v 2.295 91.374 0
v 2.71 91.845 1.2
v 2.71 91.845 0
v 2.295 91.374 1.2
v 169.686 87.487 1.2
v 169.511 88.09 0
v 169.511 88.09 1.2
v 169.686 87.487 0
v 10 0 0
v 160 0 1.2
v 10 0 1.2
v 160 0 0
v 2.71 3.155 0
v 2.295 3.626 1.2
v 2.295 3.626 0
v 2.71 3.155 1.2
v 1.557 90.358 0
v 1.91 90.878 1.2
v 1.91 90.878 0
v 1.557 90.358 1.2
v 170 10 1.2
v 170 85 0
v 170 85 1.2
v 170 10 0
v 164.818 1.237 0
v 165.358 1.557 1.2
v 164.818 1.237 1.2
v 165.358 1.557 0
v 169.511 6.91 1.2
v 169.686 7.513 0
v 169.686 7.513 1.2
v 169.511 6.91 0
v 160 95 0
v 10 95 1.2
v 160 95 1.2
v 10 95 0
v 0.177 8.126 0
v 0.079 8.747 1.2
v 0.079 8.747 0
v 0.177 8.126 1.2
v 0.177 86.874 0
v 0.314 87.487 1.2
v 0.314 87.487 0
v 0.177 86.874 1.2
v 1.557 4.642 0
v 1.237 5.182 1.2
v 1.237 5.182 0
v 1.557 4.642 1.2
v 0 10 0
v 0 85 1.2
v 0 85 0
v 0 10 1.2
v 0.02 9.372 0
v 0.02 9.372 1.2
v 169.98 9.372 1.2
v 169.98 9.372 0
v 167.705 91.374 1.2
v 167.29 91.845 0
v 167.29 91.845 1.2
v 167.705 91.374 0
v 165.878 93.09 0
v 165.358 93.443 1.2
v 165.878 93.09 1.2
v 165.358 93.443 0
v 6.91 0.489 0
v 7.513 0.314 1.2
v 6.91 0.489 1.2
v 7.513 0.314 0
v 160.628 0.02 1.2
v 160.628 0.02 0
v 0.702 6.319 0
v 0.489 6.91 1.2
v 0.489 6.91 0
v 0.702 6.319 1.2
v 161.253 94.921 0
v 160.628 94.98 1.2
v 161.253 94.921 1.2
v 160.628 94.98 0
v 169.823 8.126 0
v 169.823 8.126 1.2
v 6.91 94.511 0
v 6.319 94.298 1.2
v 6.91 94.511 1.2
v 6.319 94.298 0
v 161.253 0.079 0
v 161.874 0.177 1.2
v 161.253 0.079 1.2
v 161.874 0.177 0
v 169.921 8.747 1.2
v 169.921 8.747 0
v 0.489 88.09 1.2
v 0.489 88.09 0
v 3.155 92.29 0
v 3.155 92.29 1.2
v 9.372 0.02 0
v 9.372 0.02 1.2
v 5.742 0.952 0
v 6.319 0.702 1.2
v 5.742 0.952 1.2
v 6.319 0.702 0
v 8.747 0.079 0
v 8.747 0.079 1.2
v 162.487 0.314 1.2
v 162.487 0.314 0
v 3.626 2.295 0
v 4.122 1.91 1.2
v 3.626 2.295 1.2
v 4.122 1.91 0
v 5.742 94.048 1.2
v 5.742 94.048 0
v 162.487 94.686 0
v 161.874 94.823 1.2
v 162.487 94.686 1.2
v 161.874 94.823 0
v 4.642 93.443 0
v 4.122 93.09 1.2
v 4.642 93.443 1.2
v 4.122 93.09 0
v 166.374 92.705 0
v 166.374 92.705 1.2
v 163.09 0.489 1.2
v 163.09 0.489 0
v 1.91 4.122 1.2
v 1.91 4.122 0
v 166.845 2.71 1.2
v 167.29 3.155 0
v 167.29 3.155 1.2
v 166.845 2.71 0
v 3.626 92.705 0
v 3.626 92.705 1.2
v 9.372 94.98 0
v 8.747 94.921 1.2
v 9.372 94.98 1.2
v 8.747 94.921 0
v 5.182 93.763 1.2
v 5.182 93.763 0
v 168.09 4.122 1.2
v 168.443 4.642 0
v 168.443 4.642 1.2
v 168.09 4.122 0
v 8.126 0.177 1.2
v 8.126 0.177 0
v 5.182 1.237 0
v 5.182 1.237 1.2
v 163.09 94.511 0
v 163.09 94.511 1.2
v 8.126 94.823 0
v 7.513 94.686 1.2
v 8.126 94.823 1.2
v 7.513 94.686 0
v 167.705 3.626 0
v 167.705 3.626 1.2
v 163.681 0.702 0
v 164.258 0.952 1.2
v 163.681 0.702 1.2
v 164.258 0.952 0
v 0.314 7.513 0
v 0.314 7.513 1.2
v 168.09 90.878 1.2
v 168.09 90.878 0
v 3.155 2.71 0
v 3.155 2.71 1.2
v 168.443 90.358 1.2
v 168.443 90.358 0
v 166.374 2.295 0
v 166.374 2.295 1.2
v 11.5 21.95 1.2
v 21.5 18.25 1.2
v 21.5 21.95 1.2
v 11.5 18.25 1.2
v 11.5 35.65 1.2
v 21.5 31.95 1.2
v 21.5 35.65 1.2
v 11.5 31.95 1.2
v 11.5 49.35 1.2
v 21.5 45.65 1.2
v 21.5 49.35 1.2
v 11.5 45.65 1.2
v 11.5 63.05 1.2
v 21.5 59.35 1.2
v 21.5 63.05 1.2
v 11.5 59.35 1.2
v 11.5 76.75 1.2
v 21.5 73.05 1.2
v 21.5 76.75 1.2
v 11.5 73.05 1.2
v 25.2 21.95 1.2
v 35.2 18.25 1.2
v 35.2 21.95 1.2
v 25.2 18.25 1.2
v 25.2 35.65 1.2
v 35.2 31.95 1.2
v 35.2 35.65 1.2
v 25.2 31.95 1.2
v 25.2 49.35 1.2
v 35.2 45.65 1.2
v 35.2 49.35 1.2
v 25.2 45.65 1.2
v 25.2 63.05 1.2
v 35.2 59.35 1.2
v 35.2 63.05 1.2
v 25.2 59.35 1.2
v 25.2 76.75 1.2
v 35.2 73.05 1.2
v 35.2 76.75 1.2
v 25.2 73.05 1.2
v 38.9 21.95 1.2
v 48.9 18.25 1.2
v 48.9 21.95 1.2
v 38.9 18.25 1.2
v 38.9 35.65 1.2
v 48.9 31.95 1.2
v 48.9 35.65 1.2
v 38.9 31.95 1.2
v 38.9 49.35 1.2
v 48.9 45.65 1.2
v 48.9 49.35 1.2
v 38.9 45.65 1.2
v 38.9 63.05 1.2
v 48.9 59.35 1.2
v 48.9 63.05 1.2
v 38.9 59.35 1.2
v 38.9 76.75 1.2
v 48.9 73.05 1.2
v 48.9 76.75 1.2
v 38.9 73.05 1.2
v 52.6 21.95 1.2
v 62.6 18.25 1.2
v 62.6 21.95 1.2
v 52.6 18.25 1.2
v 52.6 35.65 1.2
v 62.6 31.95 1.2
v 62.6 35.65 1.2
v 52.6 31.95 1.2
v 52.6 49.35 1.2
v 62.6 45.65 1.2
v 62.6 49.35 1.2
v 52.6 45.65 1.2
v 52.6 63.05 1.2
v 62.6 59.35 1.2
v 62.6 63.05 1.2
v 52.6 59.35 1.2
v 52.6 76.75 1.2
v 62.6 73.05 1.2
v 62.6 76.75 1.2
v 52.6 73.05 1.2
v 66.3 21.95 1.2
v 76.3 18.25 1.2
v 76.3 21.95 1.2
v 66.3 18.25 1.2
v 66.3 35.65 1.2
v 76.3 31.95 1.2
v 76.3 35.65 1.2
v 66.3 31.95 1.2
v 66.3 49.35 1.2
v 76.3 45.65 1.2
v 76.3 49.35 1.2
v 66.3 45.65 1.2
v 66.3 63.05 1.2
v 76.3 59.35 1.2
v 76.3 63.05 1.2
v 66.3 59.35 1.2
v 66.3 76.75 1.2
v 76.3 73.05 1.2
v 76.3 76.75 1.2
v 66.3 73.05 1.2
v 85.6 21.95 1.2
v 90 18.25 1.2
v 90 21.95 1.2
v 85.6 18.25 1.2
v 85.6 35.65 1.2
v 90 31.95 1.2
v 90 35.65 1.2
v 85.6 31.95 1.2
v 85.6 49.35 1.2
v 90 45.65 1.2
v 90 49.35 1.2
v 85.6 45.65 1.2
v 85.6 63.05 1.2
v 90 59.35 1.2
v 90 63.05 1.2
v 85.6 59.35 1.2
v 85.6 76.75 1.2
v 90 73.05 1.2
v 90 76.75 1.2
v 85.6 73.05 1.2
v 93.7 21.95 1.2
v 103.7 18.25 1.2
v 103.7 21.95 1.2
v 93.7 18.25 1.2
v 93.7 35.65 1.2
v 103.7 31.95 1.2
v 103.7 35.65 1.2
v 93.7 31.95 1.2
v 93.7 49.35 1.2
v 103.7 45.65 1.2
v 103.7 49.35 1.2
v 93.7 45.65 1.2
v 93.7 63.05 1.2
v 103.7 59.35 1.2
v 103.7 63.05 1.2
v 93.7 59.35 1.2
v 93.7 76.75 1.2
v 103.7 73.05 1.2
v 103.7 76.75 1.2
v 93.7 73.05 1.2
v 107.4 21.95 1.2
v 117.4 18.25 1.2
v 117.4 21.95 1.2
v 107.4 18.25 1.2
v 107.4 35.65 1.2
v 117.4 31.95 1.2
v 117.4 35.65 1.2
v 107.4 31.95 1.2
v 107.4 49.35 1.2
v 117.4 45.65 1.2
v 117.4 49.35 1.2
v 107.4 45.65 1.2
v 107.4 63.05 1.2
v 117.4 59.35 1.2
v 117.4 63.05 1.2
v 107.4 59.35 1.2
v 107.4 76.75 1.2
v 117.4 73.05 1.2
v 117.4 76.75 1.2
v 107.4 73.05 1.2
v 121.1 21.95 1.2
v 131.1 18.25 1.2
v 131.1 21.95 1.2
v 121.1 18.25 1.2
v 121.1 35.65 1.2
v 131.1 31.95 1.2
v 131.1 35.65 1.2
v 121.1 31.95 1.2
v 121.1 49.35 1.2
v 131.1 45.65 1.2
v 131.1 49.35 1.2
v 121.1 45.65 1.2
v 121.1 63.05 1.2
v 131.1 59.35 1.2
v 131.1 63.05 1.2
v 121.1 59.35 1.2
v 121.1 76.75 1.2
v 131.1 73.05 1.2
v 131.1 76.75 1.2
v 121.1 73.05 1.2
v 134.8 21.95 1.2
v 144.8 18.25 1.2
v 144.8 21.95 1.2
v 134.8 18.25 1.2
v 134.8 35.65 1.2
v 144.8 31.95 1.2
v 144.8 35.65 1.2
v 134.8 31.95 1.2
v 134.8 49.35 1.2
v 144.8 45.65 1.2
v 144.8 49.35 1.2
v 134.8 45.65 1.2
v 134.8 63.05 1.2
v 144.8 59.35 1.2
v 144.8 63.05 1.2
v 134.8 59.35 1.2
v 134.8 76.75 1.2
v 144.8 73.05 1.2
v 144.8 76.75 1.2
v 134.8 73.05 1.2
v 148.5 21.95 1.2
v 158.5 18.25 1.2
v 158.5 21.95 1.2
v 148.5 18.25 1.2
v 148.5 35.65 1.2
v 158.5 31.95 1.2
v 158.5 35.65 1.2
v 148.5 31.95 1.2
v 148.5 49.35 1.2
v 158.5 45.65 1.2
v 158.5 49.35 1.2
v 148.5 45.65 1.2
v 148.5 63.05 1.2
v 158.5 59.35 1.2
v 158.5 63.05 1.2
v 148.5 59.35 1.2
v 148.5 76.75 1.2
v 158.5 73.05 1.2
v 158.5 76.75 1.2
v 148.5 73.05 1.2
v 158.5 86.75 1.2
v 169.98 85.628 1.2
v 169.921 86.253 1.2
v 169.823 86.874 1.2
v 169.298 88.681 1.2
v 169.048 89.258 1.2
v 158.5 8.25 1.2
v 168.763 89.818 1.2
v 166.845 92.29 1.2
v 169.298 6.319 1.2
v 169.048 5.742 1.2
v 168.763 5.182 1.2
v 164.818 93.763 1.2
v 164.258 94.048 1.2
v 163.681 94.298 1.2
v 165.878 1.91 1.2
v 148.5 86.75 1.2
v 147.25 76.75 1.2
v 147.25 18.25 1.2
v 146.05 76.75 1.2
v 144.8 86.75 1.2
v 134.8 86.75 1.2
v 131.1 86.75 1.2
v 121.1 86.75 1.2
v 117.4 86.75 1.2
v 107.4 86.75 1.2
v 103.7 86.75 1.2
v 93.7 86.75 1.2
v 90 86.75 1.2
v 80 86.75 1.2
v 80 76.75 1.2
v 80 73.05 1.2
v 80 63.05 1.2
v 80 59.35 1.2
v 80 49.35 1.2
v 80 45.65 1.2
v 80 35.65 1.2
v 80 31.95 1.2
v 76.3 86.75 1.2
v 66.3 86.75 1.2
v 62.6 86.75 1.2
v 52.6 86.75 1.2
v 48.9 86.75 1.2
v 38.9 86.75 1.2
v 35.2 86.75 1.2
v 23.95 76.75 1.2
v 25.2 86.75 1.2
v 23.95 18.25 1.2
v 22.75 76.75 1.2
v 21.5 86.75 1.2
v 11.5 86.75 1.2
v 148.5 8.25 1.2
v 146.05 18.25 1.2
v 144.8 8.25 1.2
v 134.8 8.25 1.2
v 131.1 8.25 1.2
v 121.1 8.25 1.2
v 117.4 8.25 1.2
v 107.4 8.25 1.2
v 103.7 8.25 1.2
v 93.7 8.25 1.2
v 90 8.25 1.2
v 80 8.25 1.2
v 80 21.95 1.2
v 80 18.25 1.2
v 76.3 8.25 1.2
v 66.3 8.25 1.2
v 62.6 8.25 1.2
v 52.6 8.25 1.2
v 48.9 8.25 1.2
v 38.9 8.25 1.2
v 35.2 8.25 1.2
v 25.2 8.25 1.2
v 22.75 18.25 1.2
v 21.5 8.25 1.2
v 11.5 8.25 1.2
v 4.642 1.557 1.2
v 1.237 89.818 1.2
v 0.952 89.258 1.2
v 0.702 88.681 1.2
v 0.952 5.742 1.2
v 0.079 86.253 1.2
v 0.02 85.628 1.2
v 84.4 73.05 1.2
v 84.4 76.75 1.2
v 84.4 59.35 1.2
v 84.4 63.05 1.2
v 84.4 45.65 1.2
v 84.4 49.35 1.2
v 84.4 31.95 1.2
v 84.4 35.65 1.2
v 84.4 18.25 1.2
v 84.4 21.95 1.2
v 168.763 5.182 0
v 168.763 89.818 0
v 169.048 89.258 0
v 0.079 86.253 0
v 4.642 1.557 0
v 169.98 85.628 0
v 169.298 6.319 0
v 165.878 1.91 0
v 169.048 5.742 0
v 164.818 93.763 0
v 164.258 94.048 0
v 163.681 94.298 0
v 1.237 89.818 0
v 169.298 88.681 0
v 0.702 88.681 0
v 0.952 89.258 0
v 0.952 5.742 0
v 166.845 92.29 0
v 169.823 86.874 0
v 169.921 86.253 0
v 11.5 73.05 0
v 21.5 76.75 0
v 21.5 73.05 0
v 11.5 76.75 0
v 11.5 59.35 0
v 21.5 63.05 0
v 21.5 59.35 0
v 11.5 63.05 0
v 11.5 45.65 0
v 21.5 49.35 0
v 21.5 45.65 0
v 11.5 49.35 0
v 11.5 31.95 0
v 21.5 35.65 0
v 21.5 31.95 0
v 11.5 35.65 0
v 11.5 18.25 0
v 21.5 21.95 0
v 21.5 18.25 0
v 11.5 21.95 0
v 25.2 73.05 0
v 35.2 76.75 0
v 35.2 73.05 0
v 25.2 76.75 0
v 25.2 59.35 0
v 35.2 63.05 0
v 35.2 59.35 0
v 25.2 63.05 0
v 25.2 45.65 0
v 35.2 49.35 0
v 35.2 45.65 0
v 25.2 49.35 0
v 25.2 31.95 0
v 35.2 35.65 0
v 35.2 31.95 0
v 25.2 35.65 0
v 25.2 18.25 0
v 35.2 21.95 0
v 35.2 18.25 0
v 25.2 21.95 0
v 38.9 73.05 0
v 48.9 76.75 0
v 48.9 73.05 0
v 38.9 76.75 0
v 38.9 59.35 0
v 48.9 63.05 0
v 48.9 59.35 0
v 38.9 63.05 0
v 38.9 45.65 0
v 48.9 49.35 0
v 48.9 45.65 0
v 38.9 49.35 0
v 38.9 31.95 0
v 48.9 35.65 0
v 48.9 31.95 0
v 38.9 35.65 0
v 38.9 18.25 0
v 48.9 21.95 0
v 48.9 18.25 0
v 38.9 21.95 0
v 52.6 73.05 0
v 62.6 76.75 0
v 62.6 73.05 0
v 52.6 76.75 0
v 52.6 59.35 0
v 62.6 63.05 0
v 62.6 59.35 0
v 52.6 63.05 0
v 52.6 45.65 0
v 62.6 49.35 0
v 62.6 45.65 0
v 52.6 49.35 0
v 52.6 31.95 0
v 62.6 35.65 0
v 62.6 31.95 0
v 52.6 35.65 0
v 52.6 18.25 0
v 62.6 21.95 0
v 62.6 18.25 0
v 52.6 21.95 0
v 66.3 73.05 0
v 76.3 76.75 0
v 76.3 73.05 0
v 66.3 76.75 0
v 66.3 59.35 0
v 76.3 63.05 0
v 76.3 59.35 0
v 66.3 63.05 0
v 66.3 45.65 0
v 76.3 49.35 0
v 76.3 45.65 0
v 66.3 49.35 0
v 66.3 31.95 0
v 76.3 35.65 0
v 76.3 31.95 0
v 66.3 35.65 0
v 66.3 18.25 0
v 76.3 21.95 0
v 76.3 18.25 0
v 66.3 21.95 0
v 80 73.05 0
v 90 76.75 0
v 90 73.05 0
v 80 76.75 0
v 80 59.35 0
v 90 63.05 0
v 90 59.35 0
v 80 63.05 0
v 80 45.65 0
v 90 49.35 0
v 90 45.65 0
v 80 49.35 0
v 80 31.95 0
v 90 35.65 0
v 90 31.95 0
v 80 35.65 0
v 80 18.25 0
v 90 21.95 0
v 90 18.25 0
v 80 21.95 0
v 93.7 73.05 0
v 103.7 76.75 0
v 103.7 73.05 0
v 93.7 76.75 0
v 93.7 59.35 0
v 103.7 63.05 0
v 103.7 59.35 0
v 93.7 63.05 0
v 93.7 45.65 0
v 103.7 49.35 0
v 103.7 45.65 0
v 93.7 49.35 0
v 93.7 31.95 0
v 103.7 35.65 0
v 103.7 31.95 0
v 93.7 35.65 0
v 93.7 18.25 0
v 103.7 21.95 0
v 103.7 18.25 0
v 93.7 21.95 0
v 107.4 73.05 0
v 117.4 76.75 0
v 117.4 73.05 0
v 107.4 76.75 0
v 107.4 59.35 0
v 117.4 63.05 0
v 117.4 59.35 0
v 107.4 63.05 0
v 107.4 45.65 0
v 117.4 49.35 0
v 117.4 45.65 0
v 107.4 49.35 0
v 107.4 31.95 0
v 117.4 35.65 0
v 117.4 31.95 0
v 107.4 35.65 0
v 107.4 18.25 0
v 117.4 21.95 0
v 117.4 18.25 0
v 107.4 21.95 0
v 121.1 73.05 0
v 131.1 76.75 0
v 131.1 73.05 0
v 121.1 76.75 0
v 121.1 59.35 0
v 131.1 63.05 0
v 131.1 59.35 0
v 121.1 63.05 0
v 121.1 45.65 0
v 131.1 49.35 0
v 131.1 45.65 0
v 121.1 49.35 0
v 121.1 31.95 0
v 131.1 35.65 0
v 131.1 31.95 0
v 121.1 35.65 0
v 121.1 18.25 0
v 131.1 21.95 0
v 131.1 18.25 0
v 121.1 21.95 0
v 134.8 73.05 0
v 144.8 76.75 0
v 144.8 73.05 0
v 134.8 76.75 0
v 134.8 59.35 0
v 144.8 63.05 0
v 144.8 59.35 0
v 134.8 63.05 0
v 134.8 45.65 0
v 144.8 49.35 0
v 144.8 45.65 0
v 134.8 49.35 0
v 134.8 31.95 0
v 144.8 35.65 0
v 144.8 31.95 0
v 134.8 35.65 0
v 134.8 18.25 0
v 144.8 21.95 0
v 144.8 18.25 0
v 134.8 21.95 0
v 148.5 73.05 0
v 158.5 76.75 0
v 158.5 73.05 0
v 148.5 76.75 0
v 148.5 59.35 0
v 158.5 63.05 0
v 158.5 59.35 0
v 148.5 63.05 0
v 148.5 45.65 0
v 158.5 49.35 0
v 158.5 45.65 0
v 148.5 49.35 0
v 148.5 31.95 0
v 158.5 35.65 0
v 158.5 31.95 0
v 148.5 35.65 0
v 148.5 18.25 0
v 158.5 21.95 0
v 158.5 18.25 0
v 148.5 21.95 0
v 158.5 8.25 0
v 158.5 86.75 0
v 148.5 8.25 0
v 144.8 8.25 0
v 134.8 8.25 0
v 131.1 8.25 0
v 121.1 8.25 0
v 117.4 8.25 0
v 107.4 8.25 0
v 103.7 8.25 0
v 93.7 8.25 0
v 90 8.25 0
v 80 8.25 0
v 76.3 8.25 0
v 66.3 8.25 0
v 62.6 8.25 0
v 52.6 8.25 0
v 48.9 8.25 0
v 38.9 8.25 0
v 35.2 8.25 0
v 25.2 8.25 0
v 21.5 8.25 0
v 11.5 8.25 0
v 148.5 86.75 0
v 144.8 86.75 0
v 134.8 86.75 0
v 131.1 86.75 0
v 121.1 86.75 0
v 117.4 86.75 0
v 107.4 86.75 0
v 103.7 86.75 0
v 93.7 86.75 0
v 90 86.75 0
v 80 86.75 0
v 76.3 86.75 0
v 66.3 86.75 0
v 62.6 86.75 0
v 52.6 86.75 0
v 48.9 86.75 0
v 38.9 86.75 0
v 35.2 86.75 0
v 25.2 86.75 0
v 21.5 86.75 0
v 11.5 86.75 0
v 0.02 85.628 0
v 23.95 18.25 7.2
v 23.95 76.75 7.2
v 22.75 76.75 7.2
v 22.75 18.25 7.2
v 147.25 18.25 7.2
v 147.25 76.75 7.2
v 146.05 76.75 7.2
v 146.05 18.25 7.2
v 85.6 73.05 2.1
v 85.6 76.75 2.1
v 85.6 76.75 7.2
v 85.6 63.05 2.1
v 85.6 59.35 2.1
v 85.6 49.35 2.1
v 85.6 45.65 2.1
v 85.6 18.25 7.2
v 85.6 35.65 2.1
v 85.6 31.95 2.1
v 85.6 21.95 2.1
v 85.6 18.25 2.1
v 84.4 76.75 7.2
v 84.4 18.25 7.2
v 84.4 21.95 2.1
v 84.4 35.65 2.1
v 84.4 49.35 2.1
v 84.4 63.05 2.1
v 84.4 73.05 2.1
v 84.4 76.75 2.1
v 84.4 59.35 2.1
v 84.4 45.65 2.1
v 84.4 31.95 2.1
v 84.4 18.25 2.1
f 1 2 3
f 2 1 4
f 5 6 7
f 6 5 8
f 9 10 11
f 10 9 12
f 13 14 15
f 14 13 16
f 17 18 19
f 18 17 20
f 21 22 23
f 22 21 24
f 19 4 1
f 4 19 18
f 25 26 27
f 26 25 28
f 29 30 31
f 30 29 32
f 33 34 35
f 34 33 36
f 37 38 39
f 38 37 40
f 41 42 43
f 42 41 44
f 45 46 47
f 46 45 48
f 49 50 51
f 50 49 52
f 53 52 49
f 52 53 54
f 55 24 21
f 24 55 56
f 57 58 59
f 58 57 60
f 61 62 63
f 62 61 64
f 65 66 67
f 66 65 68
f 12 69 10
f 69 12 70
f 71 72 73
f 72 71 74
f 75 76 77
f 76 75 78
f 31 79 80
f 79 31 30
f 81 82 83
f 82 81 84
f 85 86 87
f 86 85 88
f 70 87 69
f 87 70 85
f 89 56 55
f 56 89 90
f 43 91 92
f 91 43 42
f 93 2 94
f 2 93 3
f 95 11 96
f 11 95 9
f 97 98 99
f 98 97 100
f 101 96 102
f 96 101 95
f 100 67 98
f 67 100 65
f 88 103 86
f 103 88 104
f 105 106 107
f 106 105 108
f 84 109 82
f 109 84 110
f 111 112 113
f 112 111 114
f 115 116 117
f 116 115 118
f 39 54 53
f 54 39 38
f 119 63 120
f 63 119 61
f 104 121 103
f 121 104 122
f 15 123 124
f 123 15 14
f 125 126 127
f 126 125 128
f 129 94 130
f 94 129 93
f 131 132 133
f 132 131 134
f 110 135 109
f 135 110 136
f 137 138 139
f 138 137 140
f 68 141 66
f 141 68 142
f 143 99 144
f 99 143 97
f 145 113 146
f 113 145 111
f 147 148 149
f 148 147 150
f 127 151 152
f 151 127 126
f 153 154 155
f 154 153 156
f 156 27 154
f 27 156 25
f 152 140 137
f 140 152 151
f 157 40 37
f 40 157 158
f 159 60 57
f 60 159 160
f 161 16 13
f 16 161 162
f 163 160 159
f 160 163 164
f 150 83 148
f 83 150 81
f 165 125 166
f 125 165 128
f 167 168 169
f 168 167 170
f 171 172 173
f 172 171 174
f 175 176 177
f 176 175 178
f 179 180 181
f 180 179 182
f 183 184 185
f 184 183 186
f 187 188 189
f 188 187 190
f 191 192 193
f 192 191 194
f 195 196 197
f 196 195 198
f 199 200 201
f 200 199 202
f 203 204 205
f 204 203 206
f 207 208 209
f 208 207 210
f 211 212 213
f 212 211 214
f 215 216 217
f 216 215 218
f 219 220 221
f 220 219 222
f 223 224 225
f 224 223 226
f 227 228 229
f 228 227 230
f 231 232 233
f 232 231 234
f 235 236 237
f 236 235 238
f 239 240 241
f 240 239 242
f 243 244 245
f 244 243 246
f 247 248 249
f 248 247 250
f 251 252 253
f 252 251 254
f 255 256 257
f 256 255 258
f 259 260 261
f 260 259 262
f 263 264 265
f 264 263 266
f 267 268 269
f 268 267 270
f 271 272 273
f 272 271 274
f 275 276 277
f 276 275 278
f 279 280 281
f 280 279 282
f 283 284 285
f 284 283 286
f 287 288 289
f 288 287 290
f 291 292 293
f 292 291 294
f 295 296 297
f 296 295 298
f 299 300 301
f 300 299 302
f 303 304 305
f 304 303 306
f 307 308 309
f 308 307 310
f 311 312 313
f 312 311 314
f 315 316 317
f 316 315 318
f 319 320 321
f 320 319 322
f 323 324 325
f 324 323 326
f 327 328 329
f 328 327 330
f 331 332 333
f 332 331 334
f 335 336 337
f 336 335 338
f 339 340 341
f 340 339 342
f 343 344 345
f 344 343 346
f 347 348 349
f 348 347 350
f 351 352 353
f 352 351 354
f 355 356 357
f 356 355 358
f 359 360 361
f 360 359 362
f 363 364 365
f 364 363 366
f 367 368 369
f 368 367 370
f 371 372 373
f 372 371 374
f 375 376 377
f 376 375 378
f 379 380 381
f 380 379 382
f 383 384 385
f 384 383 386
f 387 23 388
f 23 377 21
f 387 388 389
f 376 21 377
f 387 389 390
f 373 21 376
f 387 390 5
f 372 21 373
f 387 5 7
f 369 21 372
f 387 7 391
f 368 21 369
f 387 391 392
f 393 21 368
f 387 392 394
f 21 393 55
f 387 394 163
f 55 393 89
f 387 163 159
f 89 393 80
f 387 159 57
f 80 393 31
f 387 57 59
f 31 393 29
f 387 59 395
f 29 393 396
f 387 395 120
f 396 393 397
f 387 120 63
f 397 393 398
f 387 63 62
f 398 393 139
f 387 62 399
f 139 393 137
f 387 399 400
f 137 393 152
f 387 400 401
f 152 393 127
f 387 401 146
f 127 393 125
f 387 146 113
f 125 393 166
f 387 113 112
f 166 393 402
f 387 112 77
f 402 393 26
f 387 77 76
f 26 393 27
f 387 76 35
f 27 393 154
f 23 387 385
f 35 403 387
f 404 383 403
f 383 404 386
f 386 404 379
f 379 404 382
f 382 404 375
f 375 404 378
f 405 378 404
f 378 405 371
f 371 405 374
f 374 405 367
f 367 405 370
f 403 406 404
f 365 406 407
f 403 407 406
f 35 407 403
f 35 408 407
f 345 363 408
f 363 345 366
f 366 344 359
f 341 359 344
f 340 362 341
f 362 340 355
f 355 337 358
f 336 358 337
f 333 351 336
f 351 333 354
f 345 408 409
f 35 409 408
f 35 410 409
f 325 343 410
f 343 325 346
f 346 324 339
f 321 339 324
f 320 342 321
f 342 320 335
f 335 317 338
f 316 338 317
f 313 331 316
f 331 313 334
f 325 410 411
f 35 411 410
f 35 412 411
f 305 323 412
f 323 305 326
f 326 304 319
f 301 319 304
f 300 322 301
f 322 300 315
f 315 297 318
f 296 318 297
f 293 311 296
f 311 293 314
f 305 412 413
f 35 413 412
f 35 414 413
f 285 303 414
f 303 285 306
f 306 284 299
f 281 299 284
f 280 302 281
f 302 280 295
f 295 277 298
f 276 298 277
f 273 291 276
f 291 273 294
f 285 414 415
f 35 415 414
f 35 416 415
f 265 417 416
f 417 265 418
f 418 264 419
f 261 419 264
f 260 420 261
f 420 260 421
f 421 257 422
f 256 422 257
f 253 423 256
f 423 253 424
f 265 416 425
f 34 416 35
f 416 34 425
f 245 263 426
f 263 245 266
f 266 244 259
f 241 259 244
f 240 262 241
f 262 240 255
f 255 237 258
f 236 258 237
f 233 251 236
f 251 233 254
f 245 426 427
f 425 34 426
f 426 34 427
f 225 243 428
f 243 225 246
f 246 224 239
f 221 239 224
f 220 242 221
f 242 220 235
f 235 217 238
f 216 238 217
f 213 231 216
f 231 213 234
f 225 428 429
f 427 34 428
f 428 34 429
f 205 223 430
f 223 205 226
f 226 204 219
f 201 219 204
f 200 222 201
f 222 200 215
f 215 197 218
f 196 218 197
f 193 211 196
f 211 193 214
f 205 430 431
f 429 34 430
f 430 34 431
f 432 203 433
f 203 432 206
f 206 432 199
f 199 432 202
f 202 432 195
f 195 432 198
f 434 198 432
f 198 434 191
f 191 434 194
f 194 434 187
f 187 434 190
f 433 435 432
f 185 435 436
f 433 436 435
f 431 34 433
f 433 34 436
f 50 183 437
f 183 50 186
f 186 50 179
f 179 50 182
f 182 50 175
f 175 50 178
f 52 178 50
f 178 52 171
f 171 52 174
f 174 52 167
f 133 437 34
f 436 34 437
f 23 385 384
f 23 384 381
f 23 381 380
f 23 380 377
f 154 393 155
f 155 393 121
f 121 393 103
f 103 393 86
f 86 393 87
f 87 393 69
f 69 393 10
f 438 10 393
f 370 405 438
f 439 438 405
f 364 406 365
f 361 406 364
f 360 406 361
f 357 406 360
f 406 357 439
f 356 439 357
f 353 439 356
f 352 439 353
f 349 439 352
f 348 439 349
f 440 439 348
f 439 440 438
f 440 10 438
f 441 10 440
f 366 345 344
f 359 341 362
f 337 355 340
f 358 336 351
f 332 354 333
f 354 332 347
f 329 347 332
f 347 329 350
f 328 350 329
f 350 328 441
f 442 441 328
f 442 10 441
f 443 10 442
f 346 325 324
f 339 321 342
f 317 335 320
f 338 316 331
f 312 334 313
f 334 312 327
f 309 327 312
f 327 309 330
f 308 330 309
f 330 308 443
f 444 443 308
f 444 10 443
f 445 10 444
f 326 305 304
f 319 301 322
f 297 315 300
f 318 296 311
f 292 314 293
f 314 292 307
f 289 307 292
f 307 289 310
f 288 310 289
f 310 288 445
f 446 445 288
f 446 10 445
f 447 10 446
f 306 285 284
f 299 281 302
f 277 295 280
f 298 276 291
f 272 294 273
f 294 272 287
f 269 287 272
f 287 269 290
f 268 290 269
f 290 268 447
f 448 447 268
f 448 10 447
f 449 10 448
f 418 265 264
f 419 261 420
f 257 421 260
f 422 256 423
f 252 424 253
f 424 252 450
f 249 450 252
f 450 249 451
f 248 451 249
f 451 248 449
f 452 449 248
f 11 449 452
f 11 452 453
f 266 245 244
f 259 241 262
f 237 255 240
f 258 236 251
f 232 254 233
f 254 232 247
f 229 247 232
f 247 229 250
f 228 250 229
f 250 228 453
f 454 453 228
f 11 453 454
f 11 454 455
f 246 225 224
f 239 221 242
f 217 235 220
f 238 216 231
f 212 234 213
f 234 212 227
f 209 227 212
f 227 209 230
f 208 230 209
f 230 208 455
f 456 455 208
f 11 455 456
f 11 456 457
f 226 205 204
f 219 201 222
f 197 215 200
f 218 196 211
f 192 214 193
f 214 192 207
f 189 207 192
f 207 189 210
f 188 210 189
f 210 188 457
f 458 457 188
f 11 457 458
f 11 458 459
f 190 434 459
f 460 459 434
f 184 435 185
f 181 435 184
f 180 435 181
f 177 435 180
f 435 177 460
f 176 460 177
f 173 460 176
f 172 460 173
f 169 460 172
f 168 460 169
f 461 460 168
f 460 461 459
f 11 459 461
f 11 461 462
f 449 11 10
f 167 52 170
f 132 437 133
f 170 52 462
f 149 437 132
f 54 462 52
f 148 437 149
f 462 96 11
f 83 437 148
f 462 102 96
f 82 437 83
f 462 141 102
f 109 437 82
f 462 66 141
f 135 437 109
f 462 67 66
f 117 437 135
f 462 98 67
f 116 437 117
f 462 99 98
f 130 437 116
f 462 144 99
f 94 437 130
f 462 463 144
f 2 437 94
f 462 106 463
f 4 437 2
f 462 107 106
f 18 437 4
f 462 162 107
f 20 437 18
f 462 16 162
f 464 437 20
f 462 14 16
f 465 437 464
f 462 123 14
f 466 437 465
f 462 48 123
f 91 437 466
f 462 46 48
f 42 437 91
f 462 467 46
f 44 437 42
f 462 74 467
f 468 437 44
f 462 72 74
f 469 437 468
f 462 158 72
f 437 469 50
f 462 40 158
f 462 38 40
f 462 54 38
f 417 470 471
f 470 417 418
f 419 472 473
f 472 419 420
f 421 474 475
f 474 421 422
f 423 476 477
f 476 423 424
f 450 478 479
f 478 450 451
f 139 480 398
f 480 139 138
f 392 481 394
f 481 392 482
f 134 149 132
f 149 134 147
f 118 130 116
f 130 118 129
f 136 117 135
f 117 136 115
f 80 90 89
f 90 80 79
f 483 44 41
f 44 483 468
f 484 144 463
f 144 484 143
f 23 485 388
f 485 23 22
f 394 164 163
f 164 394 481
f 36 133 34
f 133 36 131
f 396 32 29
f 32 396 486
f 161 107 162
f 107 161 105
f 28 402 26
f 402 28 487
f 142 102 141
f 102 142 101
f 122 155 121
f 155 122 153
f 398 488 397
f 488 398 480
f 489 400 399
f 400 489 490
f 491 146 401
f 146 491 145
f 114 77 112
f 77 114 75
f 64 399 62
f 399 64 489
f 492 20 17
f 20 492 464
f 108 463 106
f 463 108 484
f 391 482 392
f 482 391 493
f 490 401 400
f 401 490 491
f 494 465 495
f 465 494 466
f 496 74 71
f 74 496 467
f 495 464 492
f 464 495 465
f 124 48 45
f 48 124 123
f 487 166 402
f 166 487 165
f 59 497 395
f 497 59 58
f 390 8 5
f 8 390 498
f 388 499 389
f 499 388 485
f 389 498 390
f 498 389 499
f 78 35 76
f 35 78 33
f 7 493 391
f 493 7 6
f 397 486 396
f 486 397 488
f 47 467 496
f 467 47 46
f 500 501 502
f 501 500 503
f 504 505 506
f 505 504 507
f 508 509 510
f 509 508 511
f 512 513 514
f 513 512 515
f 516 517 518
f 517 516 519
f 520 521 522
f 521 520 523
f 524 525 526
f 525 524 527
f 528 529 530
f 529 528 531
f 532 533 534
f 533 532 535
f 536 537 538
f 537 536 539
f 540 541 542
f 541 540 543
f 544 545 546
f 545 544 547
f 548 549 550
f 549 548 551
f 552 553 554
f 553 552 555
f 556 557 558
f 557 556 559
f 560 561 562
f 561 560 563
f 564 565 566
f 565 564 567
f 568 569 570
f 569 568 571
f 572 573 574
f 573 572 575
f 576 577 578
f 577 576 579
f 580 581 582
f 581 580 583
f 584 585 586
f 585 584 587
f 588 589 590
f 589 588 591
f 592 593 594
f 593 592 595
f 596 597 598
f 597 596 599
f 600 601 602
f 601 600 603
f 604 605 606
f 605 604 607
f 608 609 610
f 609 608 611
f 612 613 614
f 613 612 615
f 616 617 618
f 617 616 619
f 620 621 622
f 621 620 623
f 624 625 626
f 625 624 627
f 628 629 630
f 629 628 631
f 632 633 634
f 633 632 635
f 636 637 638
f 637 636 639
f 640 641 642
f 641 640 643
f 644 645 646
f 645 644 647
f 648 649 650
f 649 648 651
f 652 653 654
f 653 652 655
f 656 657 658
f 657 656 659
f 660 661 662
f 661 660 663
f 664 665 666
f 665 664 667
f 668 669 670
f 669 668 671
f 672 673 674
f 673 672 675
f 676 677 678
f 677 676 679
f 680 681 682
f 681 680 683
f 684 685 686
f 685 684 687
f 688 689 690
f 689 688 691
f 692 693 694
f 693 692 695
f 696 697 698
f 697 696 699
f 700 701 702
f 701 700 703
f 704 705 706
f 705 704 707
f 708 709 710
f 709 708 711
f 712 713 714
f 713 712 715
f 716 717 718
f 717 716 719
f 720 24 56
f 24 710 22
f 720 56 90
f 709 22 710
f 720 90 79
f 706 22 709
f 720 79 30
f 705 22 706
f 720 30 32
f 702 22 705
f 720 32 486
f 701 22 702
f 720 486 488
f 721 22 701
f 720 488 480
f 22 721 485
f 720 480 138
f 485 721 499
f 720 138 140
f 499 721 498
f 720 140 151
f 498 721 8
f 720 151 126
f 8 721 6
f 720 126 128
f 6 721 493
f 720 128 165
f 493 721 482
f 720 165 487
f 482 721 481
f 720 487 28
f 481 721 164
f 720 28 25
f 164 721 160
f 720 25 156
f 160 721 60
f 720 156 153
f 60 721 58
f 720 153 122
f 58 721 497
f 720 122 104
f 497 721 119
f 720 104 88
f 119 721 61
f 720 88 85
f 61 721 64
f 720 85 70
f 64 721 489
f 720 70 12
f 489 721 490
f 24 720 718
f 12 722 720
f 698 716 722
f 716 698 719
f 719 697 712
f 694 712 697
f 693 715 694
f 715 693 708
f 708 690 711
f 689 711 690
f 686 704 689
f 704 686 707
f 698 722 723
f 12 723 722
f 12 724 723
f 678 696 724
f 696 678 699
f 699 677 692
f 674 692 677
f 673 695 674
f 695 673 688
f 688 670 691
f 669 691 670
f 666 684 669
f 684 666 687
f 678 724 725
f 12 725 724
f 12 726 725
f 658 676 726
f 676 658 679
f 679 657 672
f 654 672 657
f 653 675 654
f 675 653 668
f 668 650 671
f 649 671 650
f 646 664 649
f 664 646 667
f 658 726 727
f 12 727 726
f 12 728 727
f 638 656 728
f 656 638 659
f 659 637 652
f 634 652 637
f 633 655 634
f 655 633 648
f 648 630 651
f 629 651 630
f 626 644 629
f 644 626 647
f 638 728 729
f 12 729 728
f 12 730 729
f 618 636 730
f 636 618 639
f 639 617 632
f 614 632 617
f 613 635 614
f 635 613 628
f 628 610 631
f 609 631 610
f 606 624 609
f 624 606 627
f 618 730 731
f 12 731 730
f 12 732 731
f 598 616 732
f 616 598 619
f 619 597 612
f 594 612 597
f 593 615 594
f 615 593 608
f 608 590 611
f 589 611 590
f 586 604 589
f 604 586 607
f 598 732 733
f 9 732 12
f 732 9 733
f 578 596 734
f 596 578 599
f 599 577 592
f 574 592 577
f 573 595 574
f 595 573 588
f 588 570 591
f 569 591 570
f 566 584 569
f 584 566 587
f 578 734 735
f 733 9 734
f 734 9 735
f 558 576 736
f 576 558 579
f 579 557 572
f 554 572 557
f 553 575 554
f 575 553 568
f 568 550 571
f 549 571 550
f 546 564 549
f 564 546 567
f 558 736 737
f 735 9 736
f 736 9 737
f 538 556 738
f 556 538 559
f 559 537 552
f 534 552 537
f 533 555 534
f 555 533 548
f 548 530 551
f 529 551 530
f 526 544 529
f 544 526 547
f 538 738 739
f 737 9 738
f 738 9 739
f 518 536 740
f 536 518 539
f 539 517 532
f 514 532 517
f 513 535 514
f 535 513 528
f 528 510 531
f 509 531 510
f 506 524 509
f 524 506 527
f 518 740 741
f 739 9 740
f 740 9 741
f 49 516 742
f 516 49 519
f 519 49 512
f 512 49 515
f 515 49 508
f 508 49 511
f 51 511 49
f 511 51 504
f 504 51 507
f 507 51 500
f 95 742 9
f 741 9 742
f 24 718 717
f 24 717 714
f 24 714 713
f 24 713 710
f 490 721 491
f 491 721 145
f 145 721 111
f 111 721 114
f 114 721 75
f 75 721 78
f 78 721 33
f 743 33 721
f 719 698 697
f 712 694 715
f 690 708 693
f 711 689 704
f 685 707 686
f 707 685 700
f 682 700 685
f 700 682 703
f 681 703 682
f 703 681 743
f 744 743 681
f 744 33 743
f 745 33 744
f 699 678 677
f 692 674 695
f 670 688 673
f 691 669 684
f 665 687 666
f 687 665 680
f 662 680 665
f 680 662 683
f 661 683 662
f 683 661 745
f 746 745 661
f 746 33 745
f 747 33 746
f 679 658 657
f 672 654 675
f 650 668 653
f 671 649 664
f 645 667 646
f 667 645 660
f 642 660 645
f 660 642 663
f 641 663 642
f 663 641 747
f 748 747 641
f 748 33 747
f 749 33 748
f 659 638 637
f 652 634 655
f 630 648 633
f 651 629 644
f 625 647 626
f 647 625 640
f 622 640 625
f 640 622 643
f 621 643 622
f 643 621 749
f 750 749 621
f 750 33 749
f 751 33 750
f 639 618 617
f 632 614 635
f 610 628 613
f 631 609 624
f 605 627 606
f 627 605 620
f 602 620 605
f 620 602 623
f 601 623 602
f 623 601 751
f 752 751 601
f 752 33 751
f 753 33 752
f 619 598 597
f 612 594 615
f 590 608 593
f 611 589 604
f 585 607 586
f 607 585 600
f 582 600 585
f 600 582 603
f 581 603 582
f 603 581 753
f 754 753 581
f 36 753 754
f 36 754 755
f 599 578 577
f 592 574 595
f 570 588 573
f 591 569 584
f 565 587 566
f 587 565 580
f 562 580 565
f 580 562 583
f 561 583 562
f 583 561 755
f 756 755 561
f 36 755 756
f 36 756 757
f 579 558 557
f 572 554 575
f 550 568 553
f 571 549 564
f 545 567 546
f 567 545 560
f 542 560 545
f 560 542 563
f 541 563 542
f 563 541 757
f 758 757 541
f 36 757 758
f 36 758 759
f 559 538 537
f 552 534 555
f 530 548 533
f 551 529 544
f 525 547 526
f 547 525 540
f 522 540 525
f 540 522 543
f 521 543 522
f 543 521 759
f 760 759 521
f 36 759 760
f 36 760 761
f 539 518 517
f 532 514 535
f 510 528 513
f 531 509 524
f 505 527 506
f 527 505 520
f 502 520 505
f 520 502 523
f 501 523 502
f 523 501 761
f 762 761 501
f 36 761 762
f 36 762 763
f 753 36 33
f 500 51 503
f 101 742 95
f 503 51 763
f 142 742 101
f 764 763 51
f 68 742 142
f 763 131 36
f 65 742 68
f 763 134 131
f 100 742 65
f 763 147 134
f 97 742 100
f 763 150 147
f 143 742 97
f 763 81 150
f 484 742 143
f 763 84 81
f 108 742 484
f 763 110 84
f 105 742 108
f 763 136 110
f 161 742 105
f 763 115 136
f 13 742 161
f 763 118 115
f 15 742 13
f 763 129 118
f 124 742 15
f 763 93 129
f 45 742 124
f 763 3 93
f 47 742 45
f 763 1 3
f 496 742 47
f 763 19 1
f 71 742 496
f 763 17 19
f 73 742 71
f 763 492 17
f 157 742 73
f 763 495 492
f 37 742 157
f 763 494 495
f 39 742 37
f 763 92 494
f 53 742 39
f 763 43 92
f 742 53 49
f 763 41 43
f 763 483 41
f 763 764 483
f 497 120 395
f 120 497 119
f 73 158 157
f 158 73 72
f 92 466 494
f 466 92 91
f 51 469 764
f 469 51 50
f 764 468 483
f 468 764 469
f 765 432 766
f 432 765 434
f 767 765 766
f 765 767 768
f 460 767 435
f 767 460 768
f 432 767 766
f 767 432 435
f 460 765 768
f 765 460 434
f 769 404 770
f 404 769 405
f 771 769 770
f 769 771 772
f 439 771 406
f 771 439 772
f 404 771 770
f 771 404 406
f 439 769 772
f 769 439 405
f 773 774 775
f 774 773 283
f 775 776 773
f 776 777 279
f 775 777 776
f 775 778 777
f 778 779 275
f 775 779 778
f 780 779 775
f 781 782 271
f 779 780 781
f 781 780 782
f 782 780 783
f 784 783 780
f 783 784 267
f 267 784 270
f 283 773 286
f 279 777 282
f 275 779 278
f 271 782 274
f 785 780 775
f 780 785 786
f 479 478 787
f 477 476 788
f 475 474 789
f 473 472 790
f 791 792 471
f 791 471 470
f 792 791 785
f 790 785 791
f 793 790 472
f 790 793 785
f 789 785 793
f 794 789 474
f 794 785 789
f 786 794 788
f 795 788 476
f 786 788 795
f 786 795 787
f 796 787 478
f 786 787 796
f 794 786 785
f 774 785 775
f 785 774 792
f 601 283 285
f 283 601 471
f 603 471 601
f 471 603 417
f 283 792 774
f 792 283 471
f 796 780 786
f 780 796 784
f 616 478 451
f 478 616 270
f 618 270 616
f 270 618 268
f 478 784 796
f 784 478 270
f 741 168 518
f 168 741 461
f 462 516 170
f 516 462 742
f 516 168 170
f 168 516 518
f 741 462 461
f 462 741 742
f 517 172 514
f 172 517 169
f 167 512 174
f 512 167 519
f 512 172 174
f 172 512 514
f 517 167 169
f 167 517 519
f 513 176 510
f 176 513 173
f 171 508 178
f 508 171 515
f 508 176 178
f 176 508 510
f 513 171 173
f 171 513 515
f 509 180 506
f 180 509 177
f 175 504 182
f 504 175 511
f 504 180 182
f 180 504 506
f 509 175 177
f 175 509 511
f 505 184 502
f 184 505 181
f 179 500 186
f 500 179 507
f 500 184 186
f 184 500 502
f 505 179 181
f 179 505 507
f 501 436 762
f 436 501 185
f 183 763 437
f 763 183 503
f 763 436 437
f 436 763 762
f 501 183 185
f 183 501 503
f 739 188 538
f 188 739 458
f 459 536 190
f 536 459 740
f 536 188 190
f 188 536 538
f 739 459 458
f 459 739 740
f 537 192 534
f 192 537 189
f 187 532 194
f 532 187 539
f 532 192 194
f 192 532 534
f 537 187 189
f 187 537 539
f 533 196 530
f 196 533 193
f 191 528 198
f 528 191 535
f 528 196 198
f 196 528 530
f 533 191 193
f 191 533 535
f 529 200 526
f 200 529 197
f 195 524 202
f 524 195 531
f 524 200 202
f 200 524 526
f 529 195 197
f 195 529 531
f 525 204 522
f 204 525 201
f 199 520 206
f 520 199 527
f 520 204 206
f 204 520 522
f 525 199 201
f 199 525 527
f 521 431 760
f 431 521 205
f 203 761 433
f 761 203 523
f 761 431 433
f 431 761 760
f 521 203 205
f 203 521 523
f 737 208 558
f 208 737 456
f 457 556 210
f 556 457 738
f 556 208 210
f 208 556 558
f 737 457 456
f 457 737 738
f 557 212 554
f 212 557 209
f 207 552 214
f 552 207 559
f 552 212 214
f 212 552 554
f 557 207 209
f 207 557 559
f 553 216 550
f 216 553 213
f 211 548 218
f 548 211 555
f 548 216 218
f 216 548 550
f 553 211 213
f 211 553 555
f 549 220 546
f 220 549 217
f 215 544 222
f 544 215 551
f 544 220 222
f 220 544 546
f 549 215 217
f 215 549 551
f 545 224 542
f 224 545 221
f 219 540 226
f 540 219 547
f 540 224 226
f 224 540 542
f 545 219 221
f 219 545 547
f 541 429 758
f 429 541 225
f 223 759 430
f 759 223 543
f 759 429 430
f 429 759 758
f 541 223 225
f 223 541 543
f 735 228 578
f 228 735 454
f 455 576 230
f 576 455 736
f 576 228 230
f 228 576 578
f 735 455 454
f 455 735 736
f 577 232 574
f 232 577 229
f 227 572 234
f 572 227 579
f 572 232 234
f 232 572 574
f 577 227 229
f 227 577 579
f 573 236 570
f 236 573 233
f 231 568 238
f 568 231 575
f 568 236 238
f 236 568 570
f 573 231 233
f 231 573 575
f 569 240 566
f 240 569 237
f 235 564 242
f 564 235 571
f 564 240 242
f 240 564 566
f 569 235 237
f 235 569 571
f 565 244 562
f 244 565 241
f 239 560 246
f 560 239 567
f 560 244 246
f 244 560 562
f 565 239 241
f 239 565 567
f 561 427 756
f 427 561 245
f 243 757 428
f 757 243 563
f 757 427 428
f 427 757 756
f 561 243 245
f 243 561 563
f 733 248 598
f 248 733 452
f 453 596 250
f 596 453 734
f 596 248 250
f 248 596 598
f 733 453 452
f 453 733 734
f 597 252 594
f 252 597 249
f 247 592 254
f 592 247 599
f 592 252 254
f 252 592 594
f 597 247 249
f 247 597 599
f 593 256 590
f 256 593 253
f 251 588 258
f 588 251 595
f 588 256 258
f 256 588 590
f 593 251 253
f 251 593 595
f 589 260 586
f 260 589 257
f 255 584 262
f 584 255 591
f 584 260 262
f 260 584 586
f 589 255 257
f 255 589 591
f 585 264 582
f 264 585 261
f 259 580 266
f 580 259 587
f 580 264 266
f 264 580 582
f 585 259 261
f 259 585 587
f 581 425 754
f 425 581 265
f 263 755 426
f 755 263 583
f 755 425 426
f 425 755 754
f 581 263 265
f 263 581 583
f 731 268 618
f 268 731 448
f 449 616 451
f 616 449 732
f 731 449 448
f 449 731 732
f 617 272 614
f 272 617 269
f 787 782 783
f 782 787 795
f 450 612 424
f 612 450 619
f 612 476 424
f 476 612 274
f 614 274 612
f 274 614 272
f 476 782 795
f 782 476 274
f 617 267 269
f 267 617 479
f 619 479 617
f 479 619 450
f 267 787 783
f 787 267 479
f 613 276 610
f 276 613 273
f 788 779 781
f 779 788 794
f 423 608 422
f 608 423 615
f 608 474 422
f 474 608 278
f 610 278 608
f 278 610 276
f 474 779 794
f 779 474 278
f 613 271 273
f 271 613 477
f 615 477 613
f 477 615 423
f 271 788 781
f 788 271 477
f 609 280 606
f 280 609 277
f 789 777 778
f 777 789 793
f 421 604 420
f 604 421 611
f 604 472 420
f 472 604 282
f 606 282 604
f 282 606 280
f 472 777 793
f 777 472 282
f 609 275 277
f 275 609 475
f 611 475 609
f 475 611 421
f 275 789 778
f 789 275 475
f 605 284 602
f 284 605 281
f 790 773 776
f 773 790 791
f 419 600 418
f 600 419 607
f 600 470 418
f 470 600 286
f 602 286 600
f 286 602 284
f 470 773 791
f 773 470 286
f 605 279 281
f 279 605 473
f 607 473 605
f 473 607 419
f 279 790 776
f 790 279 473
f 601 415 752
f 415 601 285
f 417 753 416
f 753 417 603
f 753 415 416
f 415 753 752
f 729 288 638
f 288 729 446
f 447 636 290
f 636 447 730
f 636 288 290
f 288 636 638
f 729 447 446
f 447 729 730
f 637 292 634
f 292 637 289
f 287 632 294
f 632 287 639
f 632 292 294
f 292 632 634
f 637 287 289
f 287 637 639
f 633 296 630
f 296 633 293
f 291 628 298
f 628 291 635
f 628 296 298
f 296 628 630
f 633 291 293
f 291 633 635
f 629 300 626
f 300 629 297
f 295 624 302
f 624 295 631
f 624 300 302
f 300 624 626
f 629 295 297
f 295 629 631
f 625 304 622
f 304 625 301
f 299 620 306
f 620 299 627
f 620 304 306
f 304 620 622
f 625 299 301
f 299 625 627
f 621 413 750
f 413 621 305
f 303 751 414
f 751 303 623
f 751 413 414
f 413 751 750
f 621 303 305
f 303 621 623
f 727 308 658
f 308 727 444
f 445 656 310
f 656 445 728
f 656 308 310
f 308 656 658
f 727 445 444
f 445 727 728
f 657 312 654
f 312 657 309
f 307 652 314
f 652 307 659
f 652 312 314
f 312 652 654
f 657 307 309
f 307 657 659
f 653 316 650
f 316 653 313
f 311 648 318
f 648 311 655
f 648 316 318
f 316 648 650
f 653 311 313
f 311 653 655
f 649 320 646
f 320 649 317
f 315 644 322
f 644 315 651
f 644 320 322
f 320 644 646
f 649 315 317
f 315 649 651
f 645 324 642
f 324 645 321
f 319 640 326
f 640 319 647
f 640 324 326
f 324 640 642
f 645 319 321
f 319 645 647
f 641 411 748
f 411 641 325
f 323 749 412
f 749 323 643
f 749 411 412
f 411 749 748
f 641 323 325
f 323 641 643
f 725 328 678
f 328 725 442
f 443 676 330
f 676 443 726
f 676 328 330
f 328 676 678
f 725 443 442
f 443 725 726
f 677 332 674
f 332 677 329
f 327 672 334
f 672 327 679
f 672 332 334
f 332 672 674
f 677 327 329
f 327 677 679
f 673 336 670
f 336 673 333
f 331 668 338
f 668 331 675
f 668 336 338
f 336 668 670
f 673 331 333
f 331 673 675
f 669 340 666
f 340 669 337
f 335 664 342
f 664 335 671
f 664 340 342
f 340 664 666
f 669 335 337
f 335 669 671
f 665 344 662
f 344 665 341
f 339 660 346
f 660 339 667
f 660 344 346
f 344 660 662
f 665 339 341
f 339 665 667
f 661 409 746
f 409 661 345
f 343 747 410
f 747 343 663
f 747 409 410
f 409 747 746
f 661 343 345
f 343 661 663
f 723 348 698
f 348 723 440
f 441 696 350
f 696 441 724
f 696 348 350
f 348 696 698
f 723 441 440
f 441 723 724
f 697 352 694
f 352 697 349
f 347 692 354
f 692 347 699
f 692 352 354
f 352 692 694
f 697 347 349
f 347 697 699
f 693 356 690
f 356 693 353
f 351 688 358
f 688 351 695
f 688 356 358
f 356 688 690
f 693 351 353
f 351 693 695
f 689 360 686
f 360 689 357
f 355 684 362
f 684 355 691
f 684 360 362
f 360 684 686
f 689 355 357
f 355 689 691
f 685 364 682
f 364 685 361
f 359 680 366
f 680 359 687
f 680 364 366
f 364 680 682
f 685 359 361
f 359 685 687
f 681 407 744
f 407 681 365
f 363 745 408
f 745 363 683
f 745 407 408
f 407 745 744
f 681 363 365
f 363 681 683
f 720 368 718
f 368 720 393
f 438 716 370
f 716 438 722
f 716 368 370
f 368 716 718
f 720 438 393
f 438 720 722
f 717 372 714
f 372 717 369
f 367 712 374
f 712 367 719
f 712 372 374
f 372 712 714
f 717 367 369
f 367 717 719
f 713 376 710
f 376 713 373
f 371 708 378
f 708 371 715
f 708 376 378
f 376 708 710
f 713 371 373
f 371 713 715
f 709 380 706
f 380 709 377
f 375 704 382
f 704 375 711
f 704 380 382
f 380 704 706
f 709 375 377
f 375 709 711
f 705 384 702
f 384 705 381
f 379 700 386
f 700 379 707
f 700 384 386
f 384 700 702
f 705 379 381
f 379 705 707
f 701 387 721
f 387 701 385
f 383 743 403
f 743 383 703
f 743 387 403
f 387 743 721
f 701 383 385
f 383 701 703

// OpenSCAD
$fn=100;
// 150 x 85

t=1.2;
l=170;
w=95;
h=t+6;
rs=3.5;
r=10;
hs=3.7;
ho=10;

difference(){
    u=ho+hs;
    nw  = floor((w-ho) / u);
    nl  = floor((l-ho) / u);
    by = (w-(u*nw)+hs)/2;
    bx = (l-(u*nl)+hs)/2;
    
    union(){
        hull(){
            translate([r,r,0])
            cylinder(r=r, h=t);
            translate([r,w-r,0])
            cylinder(r=r, h=t);
            translate([l-r,w-r,0])
            cylinder(r=r, h=t);
            translate([l-r,r,0])
            cylinder(r=r, h=t);
        }
        
        translate([bx+u-hs/2-t/2, by+ho, 0])
        cube([t,w-by*2-ho*2,h]);
        translate([l-bx-u+hs/2-t/2, by+ho, 0])
        cube([t,w-by*2-ho*2,h]);

        translate([l/2-t/2, by+ho, 0])
        cube([t,w-by*2-ho*2,h]);
    }
    //------------------------------------
    //row
    for(i=[0:nl-1]){
        // col
        for(j=[0:nw-1]){
            translate([bx+u*i,by+u*j,-.1]){
                cube([ho,ho,t+1]);
            }
        }
    }
}    
